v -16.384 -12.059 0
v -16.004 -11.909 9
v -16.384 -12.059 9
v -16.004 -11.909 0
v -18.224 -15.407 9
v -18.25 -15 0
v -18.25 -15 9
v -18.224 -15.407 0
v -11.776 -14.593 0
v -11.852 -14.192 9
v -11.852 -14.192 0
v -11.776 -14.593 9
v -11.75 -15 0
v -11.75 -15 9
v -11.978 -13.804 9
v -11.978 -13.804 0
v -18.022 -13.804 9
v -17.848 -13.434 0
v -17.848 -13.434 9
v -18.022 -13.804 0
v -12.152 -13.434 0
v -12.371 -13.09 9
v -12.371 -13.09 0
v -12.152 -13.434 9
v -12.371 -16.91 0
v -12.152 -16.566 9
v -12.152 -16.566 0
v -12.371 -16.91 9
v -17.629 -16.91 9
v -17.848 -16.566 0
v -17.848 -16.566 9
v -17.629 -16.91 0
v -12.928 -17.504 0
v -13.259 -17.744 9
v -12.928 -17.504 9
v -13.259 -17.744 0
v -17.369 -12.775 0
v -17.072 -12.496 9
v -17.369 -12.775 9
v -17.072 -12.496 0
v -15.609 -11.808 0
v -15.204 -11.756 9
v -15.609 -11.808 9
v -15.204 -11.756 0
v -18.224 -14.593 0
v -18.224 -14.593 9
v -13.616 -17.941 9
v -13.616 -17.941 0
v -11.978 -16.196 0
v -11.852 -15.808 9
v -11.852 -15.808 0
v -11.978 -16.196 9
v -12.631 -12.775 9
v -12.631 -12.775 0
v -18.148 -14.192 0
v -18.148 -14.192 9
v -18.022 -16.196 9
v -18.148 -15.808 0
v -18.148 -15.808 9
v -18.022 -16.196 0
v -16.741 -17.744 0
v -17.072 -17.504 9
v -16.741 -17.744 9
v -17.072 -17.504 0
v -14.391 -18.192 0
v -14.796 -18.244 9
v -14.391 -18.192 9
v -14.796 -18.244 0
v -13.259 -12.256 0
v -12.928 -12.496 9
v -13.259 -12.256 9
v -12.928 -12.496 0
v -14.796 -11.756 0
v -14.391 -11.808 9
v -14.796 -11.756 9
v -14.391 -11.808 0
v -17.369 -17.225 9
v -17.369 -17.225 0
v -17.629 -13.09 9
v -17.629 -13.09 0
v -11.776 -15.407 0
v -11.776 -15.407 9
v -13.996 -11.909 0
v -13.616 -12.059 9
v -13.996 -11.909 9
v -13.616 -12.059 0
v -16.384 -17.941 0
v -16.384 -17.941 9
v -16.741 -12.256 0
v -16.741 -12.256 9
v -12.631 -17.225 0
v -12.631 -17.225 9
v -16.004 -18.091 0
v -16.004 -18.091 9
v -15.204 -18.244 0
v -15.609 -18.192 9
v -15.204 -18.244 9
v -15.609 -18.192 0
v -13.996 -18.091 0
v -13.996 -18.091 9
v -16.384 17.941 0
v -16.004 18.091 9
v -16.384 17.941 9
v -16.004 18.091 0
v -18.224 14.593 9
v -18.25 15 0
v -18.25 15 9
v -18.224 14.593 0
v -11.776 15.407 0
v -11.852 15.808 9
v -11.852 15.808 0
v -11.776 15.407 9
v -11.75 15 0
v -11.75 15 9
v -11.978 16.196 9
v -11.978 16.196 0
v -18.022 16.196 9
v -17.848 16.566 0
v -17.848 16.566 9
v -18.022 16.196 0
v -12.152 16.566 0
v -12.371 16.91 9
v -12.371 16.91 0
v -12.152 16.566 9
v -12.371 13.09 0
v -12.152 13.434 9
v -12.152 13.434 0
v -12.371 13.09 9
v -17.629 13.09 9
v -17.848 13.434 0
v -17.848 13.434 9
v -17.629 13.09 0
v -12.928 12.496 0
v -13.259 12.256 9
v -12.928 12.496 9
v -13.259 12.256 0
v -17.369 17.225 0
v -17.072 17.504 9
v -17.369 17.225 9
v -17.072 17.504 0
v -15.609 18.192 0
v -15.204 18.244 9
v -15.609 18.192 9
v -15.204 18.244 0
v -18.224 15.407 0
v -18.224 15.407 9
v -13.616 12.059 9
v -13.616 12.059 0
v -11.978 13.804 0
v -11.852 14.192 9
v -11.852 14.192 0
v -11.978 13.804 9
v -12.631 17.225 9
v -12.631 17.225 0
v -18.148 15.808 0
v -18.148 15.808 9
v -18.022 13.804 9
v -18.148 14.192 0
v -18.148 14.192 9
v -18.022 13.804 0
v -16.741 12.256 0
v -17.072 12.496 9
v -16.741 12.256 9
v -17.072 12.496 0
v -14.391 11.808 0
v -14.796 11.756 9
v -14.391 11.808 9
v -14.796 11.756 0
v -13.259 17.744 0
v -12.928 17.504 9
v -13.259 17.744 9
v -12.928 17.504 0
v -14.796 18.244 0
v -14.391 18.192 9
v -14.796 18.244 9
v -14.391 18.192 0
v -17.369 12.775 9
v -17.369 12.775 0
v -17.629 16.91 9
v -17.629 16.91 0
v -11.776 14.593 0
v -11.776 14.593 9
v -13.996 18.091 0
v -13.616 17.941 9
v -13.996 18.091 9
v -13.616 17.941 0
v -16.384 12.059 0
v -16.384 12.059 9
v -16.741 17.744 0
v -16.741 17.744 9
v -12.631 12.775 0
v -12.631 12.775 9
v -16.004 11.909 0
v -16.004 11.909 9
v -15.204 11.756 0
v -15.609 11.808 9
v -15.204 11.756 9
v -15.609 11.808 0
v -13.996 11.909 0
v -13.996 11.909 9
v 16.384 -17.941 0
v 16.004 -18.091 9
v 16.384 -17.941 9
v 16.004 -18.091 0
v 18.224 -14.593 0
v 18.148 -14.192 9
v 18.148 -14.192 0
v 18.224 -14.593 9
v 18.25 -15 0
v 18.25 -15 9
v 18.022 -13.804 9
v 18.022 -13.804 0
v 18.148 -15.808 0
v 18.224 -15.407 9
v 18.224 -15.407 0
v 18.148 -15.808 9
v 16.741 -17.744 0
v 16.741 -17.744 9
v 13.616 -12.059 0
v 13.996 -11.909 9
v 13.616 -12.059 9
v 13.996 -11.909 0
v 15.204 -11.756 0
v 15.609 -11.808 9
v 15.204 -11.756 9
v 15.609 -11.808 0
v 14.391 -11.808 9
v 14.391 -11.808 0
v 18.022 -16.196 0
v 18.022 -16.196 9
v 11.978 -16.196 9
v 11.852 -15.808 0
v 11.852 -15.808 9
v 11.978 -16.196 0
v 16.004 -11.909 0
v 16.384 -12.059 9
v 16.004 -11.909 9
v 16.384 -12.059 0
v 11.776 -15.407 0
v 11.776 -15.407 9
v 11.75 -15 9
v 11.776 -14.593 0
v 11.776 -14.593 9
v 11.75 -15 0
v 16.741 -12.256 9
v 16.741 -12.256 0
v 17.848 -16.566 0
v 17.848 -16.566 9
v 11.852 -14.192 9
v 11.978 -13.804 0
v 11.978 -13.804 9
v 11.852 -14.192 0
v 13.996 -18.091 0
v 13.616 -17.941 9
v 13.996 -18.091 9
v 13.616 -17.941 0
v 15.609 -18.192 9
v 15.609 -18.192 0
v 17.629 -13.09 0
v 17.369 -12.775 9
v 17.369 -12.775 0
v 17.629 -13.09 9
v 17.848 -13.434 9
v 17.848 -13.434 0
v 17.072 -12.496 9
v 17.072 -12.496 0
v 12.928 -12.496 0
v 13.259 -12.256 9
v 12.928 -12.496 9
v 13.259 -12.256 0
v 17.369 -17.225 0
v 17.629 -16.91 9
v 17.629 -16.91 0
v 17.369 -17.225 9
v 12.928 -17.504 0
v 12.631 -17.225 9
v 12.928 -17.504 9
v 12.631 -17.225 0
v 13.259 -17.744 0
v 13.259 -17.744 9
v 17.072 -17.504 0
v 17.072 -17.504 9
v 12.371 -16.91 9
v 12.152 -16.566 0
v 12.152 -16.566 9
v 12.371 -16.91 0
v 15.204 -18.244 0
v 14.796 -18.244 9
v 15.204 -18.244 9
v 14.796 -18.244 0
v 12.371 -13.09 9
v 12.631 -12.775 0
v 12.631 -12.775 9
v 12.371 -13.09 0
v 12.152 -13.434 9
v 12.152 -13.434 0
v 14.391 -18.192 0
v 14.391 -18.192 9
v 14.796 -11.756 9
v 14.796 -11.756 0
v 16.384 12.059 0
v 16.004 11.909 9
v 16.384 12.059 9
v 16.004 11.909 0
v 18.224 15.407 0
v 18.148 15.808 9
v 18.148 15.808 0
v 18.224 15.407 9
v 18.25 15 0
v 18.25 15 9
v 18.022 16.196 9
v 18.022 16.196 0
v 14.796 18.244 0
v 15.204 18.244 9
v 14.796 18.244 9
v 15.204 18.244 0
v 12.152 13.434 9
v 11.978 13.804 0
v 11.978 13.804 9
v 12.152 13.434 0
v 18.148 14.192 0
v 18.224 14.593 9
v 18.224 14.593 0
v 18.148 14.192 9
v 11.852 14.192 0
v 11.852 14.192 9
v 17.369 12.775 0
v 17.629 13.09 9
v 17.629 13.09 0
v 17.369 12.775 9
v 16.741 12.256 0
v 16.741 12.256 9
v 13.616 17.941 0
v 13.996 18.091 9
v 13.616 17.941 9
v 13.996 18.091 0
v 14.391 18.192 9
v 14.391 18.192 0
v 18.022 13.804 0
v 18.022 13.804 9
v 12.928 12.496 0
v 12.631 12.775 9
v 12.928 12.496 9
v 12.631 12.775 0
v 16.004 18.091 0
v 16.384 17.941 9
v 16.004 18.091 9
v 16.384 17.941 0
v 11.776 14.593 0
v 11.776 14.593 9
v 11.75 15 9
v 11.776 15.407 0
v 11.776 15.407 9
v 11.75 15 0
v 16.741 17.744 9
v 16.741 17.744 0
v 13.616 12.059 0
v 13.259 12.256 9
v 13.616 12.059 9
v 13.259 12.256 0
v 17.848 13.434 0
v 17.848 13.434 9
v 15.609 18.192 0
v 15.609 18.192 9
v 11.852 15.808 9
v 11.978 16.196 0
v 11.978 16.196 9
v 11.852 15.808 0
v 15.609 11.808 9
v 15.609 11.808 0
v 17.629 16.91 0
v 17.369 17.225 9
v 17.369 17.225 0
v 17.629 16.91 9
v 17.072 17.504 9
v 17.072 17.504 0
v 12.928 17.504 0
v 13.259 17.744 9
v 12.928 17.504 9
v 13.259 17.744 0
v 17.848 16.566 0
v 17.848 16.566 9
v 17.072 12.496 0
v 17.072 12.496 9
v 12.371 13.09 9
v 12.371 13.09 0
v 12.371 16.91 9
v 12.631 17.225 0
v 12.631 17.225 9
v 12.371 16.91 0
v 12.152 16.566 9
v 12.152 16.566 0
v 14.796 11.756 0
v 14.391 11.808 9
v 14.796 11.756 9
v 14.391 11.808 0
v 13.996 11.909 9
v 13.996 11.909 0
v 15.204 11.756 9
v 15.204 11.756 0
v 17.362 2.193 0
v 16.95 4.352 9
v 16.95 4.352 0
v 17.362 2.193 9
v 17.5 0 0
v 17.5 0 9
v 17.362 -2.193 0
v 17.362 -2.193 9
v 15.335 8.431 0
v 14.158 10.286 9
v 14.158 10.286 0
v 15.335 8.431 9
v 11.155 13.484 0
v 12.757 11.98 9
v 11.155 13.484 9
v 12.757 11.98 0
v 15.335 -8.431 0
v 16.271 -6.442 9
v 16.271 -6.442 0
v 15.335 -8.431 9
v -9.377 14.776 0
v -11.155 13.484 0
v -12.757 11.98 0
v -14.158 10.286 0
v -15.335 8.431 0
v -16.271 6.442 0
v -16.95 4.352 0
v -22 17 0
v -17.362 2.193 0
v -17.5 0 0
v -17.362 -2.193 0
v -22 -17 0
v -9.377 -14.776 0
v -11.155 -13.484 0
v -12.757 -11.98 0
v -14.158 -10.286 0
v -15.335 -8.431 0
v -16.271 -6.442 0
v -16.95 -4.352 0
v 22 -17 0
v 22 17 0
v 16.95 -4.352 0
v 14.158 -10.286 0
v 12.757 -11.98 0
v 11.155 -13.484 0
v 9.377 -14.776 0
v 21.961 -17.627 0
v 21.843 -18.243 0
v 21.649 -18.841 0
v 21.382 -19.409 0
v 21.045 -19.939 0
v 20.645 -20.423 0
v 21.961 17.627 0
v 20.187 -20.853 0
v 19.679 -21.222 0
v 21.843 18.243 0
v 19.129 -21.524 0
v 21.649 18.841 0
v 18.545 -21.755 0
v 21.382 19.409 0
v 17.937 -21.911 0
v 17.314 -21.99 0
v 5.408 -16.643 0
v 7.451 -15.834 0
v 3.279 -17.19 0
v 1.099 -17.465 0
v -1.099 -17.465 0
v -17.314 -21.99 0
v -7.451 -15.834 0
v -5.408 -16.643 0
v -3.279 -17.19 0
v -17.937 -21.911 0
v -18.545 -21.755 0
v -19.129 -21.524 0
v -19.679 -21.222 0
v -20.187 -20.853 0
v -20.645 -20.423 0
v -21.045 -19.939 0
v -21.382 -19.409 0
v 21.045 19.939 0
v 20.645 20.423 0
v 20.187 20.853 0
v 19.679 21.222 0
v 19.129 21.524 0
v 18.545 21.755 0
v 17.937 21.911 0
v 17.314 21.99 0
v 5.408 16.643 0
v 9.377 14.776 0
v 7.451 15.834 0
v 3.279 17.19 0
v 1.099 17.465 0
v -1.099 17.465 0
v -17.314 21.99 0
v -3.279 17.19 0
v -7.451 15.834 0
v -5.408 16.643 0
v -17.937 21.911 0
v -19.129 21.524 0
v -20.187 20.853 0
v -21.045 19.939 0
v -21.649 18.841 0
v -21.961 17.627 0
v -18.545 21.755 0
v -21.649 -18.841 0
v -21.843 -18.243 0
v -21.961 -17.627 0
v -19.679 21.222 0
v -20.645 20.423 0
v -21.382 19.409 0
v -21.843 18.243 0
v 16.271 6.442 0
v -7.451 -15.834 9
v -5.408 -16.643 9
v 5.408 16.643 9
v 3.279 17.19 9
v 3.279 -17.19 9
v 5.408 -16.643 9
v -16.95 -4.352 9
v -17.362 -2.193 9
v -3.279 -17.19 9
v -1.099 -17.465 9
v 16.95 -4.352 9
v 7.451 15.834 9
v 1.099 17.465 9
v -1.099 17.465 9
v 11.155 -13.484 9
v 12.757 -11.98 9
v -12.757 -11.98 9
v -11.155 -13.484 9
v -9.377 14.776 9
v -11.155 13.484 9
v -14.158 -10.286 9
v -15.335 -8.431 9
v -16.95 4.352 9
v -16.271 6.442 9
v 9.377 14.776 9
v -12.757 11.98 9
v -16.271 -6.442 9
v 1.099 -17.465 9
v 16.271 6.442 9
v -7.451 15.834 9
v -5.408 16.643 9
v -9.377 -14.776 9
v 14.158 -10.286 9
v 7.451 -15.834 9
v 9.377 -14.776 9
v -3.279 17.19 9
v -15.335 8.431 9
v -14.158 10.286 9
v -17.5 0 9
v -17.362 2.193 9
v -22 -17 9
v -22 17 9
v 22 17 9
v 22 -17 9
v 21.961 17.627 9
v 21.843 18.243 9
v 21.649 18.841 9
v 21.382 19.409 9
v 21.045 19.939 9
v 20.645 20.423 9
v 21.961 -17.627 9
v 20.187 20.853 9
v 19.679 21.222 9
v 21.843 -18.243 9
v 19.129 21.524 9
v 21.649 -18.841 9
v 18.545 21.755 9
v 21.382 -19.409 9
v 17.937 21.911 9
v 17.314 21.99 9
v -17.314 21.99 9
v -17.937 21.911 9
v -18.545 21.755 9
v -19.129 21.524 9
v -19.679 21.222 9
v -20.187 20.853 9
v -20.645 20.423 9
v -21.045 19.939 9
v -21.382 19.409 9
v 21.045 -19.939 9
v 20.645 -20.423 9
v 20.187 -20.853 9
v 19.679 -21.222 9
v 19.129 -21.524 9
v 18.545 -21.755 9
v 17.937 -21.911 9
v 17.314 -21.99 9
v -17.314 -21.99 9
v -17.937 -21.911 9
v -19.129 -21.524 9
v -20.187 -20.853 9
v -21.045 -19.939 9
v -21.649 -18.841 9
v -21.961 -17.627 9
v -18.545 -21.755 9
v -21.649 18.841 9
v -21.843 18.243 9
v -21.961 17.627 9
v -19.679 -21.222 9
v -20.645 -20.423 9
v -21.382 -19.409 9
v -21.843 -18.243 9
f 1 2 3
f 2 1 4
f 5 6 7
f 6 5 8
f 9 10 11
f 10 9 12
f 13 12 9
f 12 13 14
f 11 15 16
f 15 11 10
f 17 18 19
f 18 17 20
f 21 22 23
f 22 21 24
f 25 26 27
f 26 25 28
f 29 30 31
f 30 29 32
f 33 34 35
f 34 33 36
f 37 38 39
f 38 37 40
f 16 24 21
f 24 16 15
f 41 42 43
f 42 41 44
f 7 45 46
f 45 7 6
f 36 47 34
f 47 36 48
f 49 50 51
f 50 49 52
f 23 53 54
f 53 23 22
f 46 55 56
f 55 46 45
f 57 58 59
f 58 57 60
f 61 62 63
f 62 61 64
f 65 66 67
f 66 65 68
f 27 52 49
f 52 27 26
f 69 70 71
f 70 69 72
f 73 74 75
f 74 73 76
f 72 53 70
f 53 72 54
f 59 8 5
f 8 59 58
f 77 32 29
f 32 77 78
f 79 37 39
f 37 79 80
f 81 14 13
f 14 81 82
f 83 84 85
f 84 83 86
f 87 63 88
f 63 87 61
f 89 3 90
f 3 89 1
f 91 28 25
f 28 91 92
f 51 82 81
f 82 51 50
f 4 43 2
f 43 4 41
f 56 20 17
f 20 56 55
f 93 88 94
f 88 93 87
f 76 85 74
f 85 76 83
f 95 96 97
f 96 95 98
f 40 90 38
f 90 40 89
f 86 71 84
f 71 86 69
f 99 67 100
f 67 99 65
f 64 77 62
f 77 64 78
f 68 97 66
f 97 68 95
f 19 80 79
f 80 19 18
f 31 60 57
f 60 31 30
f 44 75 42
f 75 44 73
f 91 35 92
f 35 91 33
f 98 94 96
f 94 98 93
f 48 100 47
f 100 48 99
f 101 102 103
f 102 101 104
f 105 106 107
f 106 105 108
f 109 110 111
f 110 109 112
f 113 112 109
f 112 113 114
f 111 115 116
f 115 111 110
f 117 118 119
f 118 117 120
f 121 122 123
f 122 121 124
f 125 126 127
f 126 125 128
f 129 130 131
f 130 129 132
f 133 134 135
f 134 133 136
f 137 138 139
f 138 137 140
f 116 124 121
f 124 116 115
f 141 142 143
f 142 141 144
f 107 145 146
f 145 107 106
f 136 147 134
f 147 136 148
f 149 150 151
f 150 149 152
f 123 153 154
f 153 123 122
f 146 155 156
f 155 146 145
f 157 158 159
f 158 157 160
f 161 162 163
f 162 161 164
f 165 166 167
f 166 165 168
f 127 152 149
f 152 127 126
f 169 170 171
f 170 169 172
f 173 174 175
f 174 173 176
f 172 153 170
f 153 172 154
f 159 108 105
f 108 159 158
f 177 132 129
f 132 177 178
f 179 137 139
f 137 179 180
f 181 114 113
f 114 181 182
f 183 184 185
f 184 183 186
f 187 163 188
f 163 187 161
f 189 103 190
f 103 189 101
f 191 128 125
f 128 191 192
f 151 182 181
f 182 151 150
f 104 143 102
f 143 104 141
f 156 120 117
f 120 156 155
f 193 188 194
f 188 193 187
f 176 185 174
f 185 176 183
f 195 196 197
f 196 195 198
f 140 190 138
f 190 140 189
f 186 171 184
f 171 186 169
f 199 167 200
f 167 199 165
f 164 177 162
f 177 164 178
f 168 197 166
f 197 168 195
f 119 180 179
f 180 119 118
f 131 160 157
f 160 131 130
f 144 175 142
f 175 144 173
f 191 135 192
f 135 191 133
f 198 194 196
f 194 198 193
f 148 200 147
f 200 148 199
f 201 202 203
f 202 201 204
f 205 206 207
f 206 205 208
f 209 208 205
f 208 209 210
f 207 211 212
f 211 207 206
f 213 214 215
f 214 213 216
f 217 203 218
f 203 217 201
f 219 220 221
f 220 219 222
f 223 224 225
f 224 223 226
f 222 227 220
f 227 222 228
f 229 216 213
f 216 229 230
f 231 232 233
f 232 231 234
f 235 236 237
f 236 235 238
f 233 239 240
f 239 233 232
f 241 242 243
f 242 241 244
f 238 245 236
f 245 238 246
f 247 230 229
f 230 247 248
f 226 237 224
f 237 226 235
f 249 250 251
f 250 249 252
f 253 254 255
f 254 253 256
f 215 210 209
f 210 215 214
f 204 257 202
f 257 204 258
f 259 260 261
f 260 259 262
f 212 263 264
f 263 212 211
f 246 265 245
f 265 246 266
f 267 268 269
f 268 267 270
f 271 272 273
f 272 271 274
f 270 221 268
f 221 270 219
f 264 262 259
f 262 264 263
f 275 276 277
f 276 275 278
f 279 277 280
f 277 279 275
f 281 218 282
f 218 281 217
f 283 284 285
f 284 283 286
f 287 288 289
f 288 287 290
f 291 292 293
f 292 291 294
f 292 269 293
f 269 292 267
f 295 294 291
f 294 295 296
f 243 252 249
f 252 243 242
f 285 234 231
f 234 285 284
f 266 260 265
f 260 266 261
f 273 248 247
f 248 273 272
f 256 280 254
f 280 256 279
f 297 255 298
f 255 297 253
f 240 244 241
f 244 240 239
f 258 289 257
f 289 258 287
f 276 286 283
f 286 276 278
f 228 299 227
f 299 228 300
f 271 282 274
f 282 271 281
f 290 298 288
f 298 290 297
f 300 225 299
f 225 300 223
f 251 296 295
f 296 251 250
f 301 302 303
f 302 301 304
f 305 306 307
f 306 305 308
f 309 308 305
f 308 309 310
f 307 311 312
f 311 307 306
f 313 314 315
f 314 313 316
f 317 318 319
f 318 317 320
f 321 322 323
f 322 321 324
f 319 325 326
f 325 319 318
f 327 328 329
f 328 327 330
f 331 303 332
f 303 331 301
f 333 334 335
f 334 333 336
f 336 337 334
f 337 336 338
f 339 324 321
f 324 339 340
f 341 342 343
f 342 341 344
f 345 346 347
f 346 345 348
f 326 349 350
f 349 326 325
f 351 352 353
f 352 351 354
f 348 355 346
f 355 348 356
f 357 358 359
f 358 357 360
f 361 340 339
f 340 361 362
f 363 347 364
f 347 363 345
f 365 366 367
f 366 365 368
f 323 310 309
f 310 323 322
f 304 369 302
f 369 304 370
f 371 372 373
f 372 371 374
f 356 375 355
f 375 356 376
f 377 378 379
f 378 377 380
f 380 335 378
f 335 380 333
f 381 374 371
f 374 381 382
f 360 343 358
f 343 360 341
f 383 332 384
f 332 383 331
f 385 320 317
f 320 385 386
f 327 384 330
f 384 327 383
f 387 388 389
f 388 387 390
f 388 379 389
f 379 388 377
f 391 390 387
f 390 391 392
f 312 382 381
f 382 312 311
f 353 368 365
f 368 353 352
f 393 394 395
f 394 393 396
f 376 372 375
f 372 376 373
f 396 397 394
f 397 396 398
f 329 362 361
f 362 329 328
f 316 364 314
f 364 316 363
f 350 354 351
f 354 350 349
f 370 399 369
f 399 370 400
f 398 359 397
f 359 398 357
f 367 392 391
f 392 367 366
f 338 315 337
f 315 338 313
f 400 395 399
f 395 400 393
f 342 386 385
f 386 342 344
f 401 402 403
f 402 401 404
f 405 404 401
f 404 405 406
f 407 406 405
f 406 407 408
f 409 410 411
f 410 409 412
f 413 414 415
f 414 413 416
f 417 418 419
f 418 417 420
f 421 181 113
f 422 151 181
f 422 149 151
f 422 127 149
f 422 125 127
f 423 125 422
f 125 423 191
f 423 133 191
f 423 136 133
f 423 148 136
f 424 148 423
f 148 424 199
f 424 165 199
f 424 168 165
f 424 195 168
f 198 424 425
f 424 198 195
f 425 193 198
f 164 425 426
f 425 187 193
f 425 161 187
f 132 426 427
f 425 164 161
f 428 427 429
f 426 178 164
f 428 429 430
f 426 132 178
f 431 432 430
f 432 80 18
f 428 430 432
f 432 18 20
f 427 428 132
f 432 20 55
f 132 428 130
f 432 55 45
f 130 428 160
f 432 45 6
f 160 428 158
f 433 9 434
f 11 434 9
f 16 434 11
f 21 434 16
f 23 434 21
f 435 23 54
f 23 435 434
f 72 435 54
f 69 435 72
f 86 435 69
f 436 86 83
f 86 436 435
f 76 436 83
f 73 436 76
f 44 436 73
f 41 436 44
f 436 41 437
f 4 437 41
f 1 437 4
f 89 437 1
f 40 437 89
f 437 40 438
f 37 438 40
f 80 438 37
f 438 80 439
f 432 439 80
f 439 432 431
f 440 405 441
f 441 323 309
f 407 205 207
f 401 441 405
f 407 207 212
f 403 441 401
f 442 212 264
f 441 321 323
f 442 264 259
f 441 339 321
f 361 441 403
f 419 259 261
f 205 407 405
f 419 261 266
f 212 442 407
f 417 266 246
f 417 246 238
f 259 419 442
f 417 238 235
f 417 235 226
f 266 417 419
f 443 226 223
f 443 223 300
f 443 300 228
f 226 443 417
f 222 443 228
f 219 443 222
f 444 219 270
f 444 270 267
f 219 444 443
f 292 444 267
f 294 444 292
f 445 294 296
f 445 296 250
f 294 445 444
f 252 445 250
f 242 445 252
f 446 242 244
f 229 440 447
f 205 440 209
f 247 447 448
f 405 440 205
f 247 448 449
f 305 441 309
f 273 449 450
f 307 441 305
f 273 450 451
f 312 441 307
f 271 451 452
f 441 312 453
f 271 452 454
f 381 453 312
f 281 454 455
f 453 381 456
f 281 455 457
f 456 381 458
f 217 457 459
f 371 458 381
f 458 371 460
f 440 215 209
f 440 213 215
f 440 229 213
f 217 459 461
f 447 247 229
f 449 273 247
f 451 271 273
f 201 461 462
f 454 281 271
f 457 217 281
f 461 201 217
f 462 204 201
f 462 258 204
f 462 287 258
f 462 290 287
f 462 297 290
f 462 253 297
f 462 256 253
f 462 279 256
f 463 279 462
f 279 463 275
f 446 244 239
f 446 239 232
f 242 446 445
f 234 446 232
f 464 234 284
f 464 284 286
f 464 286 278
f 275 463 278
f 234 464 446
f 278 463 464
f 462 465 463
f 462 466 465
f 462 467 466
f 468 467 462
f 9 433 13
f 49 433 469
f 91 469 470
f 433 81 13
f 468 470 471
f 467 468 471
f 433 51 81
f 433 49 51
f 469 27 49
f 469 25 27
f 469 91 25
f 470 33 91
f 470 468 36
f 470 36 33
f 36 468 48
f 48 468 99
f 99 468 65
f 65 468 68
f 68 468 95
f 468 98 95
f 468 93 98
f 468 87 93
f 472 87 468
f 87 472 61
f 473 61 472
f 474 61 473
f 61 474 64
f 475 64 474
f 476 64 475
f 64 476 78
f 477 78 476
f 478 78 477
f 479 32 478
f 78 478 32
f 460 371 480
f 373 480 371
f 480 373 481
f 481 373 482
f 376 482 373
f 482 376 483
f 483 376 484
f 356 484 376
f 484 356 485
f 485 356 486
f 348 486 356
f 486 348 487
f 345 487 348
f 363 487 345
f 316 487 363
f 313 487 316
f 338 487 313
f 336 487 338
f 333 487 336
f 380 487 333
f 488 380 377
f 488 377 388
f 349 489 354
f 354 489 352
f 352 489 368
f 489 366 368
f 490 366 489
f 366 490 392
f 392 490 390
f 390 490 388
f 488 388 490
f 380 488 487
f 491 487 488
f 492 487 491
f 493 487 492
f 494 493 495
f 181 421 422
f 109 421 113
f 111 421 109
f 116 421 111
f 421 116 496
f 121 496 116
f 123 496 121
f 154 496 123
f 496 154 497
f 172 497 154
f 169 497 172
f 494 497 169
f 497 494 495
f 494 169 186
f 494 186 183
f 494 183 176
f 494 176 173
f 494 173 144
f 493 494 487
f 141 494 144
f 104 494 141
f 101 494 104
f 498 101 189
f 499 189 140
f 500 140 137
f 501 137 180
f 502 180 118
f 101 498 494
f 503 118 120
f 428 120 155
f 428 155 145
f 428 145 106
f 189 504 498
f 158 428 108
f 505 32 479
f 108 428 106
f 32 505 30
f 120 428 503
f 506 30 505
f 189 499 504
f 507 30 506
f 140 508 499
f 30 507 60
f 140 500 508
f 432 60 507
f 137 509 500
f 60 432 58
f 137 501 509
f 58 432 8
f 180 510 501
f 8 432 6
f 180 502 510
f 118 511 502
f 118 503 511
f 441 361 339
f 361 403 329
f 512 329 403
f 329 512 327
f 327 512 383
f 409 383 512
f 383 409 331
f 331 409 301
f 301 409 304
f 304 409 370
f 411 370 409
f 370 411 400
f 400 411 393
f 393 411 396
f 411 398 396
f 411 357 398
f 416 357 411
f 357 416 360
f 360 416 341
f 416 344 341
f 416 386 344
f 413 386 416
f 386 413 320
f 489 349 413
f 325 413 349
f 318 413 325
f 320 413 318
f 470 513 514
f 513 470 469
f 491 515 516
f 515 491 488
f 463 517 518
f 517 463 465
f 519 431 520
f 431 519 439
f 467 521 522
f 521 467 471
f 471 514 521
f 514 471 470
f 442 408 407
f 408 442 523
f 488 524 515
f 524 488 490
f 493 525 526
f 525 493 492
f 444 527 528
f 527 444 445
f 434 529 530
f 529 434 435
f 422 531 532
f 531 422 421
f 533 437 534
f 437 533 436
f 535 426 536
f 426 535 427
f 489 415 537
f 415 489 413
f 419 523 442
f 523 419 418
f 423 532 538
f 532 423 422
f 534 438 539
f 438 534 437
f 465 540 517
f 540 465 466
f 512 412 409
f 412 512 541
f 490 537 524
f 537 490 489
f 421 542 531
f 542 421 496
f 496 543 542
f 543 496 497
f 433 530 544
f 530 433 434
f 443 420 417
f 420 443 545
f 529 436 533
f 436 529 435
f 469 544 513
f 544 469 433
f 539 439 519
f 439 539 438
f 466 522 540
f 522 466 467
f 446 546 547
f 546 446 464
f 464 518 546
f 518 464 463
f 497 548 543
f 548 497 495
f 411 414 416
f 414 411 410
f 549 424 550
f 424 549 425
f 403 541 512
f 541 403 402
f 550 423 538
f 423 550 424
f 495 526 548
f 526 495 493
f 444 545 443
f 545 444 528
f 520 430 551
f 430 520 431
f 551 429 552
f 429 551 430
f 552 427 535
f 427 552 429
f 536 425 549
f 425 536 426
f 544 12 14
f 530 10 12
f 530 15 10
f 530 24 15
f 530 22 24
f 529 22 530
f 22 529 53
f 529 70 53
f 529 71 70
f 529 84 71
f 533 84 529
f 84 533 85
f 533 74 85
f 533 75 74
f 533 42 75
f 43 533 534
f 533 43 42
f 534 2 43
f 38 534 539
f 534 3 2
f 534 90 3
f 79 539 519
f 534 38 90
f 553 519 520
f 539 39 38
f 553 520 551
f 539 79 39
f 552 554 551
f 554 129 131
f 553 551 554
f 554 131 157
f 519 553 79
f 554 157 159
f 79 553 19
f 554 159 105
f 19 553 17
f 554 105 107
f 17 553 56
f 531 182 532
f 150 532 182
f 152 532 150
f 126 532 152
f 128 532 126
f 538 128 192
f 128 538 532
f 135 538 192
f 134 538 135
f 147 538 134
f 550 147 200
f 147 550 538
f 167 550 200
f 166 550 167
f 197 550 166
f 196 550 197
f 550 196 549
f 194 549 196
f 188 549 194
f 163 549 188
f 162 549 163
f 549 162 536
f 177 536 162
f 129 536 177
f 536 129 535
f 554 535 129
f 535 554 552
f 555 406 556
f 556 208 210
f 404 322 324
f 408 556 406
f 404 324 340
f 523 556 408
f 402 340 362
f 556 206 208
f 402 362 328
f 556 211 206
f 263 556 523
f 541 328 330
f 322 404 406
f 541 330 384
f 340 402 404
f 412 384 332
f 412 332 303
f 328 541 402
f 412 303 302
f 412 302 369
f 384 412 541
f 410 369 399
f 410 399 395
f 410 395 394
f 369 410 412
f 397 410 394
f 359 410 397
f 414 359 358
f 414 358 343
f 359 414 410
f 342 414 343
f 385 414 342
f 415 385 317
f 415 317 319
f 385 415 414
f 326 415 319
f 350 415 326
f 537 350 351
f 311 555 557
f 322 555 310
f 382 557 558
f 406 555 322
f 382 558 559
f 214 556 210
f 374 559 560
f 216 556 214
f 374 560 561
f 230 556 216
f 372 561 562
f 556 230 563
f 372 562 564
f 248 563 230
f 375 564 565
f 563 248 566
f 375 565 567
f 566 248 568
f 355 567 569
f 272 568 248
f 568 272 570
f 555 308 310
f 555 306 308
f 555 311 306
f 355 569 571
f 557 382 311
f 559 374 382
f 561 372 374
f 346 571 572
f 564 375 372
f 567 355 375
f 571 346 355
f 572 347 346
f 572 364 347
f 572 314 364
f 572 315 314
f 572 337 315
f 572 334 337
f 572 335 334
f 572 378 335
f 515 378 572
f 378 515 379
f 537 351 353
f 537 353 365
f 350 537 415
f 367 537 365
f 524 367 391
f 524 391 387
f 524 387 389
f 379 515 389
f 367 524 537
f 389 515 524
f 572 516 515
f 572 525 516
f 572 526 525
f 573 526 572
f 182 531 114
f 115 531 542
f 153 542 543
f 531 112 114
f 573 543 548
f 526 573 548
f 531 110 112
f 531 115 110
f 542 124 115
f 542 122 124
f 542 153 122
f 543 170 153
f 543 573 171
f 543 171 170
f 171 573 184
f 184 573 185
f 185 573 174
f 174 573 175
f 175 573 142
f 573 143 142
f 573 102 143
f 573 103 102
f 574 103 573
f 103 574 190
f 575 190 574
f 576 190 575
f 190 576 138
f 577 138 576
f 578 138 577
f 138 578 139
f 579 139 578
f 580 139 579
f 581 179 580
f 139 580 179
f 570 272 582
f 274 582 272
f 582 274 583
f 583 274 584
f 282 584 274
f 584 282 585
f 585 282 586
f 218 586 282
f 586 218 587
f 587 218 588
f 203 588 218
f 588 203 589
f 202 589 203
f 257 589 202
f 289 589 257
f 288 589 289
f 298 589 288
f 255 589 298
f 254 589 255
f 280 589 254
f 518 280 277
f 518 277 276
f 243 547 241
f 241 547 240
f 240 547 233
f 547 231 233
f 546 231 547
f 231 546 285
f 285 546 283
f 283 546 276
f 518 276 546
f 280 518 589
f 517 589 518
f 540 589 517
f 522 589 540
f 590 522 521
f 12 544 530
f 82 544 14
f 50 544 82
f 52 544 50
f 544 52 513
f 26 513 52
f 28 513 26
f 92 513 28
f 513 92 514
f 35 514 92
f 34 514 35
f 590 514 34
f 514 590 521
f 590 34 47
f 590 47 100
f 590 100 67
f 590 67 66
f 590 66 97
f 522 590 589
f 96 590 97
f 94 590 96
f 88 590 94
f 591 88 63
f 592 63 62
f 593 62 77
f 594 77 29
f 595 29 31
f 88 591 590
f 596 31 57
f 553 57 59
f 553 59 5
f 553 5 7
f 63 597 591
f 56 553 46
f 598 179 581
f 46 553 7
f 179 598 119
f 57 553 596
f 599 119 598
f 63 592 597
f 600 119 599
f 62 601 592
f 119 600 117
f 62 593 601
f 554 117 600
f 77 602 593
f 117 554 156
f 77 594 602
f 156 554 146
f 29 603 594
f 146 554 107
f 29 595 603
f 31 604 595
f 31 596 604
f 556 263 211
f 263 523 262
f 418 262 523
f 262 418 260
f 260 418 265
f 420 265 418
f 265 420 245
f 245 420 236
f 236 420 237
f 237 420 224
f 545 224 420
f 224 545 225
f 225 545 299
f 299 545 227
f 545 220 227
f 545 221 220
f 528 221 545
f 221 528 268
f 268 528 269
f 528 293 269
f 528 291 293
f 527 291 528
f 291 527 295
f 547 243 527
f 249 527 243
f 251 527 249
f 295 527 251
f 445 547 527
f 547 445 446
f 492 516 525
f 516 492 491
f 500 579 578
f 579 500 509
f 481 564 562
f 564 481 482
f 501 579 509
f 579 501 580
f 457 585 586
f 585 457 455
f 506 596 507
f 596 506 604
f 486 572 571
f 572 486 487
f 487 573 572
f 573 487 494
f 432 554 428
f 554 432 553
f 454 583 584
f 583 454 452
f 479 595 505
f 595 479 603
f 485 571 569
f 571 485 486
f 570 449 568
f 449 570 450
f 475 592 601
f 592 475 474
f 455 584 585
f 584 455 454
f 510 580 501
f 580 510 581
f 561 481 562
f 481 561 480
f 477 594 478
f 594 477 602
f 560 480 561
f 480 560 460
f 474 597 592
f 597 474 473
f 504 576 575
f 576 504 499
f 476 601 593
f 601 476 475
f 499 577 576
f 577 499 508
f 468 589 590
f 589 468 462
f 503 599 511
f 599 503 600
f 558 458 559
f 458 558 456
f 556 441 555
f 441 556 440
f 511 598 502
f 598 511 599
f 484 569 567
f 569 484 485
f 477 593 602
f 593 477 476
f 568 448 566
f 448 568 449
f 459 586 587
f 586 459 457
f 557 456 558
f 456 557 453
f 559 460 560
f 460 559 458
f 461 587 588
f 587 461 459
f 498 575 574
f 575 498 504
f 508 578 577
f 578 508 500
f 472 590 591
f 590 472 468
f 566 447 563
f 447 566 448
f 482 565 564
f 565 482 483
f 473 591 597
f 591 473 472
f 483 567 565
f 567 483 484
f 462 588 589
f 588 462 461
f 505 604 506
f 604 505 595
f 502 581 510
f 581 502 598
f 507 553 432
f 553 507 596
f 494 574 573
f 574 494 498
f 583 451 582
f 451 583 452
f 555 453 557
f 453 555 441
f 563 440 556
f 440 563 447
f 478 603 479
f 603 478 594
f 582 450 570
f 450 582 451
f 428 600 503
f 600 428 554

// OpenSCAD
$fn = 50;


difference() {
	union() {
		hull() {
			translate(v = [-17.0000000000, 17.0000000000, 0]) {
				cylinder(h = 9, r = 5);
			}
			translate(v = [17.0000000000, 17.0000000000, 0]) {
				cylinder(h = 9, r = 5);
			}
			translate(v = [-17.0000000000, -17.0000000000, 0]) {
				cylinder(h = 9, r = 5);
			}
			translate(v = [17.0000000000, -17.0000000000, 0]) {
				cylinder(h = 9, r = 5);
			}
		}
	}
	union() {
		#translate(v = [-15.0000000000, -15.0000000000, -100.0000000000]) {
			cylinder(h = 200, r = 3.2500000000);
		}
		#translate(v = [-15.0000000000, 15.0000000000, -100.0000000000]) {
			cylinder(h = 200, r = 3.2500000000);
		}
		#translate(v = [15.0000000000, -15.0000000000, -100.0000000000]) {
			cylinder(h = 200, r = 3.2500000000);
		}
		#translate(v = [15.0000000000, 15.0000000000, -100.0000000000]) {
			cylinder(h = 200, r = 3.2500000000);
		}
		#cylinder(h = 9, r = 17.5000000000);
	}
}
